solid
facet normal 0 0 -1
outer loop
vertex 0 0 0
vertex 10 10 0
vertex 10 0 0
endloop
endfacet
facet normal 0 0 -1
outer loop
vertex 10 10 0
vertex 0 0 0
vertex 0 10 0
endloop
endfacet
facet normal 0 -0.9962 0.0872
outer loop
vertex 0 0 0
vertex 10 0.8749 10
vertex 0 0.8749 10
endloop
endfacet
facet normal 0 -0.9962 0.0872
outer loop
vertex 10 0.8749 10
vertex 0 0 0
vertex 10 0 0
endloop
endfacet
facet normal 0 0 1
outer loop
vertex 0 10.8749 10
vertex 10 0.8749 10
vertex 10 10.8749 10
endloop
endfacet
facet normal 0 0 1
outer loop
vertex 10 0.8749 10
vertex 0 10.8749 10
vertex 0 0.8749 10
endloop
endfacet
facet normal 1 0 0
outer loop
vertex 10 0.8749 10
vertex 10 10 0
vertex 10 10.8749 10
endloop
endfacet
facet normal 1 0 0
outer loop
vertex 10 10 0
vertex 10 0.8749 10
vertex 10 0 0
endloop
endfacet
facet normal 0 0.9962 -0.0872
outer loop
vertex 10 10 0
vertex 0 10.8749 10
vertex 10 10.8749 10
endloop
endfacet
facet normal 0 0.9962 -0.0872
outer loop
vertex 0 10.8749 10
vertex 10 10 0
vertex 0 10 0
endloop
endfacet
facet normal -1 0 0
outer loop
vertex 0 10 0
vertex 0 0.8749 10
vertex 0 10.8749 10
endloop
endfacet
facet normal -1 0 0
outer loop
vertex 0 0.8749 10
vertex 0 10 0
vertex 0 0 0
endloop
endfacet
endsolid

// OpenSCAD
module trapezoid(height=10, x=[30,20], y=[45,40], skew = 0, center=false) {
    kskew = is_list(skew)?skew:[skew,skew];
    kx = is_list(x)?x:[x,x];
    ky = is_list(y)?y:[y,y];
    off = [kx[0]-kx[1],ky[0]-ky[1]]/2 + kskew;
    points = [
        // bottom rectangle
        [0,0,0],
        [kx[0],0,0],
        [kx[0],ky[0],0],
        [0, ky[0], 0],
        // top rectangle
        [off.x,off.y,height],
        [off.x+kx[1],off.y,height],
        [off.x+kx[1],off.y+ky[1], height],
        [off.x,off.y+ky[1],height]
    ];
    faces = [
        [0,1,2,3],  // bottom
  [4,5,1,0],  // front
  [7,6,5,4],  // top
  [5,6,2,1],  // right
  [6,7,3,2],  // back
  [7,4,0,3]]; // left

    translate(center?[-kx[0]/2,-ky[0]/2,-height/2]:[0,0,0])
    polyhedron(points, faces,convexity=2);
}

module skewed_cube(size, angle=5, center = false) {
    cSize = is_list(size) ? [size.x, size.y] : [size, size];
    cAngle = is_list(angle) ? angle : [0,angle];
    ht = is_list(size) ? size.z : size;
    skew = [ht * tan(cAngle.x), ht * tan(cAngle.y)];
    trapezoid(ht, x=cSize.x, y=cSize.y, skew=skew, center=center);
}

module skewed_cylinder(h=20, d=10, angle=5) {
    cosA = cos(angle);
    tanA = tan(angle);
    xFace = -d/cosA;
    r=d/2;
    echo(cosA, xFace);
//    render(convexity=1)
    difference() {
        rotate([angle,0,0]) cylinder(h = h/cosA+d*tanA, d=d, center=true);
//        #translate([0,(xFace-sign(xFace))/2, h/2+1]) cube([d+2,abs(xFace)+2,d+1], center=true);
 translate([0, (-tanA*h-sign(h))/2, 1+(h+d)/2]) cube([d,abs(xFace)+2,d+2], center=true);
 translate([0, (tanA*h+sign(h))/2, -1-(h+d)/2]) cube([d,abs(xFace)+2,d+2], center=true);
    }
}

skewed_cube(size=10);
//trapezoid(height=16,x=[10,23],y=[10,5],skew=[-2.5,0],center=true);
////translate([0,0,20]) trapezoid(10, 20, 30, 20);
//double_trapezoid(10, [20,30], [40,20], false);
//translate([0, 0, -5.1]) square([20,30], true);
//translate([0, 0, 5.1]) square([40,20], true);
